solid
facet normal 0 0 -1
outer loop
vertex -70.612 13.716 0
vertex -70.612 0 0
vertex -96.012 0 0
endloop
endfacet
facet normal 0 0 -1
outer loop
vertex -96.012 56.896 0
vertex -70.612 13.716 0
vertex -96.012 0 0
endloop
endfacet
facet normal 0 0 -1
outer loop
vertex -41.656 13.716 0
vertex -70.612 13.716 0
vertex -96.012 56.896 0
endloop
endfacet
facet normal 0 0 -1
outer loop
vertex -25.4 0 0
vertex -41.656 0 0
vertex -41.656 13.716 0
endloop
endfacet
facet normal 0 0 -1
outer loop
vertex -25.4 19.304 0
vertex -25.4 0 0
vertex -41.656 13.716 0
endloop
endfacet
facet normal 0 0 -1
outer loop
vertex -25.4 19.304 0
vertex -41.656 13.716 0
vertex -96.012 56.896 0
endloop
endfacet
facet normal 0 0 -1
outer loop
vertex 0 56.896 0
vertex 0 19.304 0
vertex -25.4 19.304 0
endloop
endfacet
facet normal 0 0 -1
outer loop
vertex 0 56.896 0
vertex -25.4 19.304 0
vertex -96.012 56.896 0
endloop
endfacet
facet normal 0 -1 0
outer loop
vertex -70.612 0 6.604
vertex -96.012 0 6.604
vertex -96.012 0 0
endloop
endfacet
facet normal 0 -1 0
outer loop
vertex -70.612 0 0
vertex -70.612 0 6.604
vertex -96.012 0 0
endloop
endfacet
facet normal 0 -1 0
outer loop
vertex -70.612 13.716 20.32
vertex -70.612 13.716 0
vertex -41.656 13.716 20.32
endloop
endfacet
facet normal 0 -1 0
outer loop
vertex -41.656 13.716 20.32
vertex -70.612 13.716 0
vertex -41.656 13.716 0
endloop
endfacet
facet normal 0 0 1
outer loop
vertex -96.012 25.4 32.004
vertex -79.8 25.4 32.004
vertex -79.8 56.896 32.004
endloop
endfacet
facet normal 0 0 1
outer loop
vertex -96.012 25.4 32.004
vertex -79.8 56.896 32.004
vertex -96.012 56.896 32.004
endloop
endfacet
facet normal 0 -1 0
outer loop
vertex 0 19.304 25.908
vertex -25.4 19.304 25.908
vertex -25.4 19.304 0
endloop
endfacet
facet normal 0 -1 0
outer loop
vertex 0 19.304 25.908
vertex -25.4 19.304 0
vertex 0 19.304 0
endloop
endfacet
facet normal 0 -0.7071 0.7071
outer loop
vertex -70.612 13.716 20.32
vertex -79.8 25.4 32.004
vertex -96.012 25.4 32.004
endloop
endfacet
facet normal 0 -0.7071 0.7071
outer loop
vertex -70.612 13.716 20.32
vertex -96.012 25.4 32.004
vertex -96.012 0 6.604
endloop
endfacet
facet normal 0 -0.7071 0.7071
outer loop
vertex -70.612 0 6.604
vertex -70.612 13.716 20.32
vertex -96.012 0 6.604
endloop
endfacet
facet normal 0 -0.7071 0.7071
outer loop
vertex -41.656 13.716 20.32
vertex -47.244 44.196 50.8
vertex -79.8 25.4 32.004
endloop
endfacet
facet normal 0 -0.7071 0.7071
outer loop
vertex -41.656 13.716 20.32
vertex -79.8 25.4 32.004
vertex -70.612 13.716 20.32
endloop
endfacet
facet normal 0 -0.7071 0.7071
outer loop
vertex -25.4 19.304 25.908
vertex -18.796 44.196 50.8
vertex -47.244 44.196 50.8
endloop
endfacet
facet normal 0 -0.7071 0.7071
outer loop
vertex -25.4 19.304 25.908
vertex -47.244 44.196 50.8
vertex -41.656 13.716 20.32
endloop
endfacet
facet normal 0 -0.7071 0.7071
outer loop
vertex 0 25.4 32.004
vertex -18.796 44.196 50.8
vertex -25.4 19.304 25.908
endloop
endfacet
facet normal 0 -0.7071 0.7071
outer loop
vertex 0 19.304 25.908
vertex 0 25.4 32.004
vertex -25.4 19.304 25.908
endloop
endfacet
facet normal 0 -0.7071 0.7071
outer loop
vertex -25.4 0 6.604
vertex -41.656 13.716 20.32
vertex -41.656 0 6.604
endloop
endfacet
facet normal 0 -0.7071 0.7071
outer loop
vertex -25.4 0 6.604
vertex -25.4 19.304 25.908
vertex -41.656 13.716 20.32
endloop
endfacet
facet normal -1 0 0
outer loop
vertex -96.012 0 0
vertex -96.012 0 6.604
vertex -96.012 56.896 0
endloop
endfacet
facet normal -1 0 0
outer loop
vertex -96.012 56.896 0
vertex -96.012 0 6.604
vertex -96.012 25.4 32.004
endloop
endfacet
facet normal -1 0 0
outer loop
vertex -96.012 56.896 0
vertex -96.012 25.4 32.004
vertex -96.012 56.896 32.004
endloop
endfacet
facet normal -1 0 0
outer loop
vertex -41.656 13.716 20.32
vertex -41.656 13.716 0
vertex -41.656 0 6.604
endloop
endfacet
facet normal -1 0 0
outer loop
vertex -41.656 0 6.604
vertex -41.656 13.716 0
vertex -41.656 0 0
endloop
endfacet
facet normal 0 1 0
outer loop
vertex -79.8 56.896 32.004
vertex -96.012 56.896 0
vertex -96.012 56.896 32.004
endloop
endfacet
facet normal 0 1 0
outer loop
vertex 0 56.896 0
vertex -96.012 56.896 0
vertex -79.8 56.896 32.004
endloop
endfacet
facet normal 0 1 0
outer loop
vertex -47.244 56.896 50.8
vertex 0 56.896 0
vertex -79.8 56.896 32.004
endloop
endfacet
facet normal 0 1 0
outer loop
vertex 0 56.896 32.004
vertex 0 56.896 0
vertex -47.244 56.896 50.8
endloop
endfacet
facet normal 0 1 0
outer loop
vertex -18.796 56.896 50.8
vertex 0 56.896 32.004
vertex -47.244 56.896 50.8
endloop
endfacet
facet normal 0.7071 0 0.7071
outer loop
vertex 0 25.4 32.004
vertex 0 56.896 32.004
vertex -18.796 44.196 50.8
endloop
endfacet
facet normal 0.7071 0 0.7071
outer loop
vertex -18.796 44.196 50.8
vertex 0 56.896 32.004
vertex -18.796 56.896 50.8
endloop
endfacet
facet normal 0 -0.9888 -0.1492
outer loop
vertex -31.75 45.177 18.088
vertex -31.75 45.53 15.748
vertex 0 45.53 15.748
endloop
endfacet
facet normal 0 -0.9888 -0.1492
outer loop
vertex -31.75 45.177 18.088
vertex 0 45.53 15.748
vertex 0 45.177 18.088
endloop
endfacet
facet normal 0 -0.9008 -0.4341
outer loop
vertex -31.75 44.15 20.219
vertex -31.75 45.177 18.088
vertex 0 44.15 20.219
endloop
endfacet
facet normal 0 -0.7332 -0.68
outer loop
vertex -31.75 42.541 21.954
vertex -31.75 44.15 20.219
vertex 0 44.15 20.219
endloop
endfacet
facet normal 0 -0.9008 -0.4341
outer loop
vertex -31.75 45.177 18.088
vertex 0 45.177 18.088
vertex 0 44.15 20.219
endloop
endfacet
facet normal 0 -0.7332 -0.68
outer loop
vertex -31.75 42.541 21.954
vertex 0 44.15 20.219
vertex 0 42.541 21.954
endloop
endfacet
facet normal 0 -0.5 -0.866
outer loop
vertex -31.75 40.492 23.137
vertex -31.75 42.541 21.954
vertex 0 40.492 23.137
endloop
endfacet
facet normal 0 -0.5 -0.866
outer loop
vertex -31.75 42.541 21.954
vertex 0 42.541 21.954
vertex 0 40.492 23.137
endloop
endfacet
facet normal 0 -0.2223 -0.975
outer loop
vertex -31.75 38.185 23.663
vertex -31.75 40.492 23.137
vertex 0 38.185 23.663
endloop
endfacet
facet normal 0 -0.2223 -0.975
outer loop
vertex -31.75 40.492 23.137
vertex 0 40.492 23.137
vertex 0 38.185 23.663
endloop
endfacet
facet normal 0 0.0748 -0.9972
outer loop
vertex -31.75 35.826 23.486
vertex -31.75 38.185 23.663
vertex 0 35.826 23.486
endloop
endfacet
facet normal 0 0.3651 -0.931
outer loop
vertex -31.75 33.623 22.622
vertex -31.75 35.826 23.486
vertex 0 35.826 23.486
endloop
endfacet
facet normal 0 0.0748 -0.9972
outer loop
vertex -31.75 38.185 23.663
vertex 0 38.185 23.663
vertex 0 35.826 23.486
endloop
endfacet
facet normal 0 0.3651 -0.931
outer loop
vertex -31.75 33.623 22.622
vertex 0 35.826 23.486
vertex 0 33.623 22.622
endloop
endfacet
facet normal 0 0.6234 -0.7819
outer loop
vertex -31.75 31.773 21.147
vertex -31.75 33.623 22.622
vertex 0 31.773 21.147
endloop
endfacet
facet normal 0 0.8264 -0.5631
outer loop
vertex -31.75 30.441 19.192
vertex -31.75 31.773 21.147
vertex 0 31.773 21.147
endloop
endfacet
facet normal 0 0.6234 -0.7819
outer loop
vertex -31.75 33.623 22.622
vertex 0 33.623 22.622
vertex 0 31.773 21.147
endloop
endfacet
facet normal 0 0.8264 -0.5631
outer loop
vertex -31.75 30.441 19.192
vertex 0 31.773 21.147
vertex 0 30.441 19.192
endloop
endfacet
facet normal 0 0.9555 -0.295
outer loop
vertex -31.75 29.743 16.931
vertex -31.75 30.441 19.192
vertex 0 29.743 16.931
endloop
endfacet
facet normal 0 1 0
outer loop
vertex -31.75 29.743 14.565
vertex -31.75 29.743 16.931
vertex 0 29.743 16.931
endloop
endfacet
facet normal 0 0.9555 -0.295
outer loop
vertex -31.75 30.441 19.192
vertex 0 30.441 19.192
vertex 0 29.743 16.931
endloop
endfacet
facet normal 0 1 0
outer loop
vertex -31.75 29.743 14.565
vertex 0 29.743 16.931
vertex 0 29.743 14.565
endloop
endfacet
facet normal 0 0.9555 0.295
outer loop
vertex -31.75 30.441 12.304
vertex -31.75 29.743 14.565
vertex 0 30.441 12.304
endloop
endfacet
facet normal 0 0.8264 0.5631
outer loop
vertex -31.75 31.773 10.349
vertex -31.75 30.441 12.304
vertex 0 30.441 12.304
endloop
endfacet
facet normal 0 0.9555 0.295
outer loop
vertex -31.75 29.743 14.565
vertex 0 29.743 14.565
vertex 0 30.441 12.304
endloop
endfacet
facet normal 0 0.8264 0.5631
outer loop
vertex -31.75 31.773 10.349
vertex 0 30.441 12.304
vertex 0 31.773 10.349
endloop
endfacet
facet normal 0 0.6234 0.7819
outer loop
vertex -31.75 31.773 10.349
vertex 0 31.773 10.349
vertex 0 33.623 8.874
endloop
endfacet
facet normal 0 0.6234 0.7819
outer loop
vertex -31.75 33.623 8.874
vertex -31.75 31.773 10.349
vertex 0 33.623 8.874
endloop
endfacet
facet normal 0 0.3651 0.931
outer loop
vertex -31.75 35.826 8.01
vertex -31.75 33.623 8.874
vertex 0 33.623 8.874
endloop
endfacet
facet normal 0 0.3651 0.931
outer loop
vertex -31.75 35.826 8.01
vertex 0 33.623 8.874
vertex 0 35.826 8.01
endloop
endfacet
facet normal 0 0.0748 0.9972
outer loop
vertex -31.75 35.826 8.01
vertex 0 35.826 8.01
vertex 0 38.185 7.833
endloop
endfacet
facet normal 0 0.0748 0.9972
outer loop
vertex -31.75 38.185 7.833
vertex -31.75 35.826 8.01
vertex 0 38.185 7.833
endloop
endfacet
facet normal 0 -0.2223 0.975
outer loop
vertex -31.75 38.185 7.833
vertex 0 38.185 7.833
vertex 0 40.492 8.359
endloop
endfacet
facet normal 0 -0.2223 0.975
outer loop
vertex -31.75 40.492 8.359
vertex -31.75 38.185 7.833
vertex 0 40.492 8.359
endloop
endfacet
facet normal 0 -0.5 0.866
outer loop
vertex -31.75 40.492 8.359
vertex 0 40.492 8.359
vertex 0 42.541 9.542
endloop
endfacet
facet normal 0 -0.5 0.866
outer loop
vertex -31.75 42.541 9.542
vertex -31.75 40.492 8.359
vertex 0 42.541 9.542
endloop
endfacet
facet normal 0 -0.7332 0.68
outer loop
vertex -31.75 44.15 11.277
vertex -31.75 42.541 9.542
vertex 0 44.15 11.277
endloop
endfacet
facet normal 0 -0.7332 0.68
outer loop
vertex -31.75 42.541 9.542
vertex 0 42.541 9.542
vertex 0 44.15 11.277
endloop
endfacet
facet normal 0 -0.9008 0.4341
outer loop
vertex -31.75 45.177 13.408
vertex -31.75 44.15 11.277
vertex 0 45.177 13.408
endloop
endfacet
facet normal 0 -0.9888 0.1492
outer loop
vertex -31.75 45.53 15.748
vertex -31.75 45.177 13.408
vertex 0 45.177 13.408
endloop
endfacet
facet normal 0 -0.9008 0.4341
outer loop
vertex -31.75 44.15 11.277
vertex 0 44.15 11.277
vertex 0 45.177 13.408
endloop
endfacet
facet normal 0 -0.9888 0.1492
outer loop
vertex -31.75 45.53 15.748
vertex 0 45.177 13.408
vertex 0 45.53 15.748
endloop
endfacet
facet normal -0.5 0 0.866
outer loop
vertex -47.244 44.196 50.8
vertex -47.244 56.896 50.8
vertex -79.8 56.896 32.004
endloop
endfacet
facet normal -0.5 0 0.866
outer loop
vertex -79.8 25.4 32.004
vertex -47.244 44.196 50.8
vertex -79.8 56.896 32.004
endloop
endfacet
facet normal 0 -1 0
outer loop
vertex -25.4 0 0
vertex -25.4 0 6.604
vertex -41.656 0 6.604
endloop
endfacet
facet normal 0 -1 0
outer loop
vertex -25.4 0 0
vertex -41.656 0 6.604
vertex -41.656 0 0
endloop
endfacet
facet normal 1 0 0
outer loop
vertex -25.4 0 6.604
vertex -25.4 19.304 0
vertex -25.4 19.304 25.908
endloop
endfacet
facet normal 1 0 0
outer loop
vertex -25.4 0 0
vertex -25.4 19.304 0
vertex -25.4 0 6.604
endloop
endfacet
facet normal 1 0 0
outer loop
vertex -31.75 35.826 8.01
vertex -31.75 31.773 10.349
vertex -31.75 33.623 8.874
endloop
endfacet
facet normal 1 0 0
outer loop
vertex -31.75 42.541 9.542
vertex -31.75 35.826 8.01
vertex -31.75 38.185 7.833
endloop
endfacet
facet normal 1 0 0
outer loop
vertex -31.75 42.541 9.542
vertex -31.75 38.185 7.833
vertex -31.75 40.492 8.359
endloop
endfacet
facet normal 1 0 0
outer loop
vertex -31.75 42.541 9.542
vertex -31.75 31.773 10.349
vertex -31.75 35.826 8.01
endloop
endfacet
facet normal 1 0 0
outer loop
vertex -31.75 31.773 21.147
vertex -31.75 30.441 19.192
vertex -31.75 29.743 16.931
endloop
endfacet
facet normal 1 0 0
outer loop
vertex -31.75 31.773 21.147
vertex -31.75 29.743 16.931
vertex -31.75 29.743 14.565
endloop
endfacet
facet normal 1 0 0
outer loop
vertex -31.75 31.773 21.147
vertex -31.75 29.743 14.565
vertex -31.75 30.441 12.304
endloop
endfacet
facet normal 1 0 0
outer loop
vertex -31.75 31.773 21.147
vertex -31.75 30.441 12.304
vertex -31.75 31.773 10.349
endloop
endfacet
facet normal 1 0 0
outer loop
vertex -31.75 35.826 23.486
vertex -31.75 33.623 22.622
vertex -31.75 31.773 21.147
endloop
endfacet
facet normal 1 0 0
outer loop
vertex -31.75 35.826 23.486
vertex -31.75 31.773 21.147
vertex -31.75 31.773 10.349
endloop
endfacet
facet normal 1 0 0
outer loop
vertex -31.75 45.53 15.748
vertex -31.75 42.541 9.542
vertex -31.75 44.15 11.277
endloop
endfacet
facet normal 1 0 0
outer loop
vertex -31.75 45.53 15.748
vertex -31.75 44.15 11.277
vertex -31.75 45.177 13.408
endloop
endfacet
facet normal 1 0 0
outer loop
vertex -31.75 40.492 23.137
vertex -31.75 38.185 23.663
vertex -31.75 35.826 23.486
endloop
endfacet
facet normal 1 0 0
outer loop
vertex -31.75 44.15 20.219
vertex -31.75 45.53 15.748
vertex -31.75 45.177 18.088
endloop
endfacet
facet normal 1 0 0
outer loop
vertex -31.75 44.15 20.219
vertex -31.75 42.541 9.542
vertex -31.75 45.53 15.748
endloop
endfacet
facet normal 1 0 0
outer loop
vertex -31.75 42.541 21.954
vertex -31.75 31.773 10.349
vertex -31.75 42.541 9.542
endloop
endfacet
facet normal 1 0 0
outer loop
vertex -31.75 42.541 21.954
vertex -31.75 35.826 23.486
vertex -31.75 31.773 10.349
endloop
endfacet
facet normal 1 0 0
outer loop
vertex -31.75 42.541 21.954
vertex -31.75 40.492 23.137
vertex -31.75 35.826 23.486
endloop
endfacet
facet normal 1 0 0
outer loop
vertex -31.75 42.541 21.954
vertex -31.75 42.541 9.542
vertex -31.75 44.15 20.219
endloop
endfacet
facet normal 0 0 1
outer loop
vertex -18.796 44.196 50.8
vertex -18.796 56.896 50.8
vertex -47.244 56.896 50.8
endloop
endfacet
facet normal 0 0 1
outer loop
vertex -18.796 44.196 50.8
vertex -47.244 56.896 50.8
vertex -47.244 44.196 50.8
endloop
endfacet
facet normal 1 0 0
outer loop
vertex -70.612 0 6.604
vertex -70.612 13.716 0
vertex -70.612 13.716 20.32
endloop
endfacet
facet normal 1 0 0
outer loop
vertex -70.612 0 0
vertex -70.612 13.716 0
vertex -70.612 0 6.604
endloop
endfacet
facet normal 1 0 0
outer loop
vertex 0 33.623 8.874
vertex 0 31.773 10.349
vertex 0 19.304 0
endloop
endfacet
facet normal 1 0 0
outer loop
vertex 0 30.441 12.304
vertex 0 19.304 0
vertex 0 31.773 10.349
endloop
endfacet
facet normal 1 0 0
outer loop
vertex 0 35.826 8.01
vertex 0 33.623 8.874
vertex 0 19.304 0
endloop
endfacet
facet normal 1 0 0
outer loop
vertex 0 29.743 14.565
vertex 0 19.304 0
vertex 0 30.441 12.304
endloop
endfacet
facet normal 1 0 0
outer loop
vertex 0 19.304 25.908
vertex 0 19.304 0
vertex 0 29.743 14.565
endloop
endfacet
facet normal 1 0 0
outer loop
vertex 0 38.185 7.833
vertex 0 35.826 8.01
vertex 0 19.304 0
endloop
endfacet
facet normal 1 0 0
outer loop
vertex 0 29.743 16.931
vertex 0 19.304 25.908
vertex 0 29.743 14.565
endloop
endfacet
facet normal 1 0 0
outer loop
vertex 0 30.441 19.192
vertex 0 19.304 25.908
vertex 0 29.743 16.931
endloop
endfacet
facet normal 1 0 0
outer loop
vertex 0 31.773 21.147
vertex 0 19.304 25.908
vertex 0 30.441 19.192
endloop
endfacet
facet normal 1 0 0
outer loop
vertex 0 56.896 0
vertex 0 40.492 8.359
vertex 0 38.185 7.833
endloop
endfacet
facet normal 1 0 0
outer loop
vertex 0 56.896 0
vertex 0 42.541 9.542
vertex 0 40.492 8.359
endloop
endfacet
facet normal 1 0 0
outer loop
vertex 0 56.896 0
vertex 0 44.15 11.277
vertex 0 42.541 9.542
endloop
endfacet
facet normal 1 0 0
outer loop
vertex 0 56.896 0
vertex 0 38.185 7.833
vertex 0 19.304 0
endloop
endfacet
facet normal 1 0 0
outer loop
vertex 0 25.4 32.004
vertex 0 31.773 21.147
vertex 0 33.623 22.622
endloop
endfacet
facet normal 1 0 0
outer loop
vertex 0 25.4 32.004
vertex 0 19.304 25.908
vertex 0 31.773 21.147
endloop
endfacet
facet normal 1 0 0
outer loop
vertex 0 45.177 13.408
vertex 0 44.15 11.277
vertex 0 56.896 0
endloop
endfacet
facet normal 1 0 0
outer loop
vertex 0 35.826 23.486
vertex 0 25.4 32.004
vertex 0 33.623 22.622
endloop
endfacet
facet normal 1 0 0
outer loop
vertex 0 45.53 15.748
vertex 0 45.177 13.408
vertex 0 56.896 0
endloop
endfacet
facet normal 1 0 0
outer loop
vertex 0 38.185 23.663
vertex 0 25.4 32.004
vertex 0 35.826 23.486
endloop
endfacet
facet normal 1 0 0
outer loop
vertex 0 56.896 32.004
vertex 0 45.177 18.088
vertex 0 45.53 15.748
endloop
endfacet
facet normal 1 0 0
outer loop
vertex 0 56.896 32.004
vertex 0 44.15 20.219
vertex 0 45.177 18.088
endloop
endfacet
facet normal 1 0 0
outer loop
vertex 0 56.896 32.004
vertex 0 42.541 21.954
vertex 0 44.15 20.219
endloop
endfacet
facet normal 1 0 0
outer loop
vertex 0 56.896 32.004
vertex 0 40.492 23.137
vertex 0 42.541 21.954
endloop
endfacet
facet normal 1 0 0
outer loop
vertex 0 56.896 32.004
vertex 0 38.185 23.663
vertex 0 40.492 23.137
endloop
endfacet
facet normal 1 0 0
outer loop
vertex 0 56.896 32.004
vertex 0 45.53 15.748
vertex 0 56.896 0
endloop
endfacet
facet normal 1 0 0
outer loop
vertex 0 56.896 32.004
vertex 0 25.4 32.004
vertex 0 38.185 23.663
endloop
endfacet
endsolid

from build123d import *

# Parameters (mm, degrees)
F0_R     = 7.9375
F1_DEPTH = 96.012
F2_DEPTH = 31.75
F3_W     = 25.4
F3_H     = 19.304
F3_W_2   = 28.956
F3_H_2   = 13.716
F4_DEPTH = 51.562
F6_DEPTH = 69.088


with BuildPart() as f1:
    # F0 (on Right) → F1 (new body)
    with BuildSketch(Plane.YZ):
        Polygon((0, 6.604), (0, 0), (56.896, 0), (56.896, 50.8), (44.196, 50.8), align=None)
        with Locations((37.592, 15.748)):
            Circle(F0_R, mode=Mode.SUBTRACT)
        with Locations((37.592, 15.748)):
            Circle(F0_R)
    extrude(amount=-F1_DEPTH)

    # F0 (on Right) → F2 (cut)
    with BuildSketch(Plane.YZ):
        with Locations((37.592, 15.748)):
            Circle(F0_R)
    extrude(amount=-F2_DEPTH, mode=Mode.SUBTRACT)

    # F3 (on face) → F4 (cut)
    with BuildSketch(Plane(origin=(0, 0, 0), x_dir=(1, 0, 0), z_dir=(0, 0, -1))):
        with Locations((-12.7, -9.652)):
            Rectangle(F3_W, F3_H)
        with Locations((-56.134, -6.858)):
            Rectangle(F3_W_2, F3_H_2)
    extrude(amount=-F4_DEPTH, mode=Mode.SUBTRACT)

    # F5 (on face) → F6 (cut)
    with BuildSketch(Plane(origin=(0, 56.896, 0), x_dir=(-1, 0, 0), z_dir=(0, 1, 0))):
        Polygon((18.796, 50.8), (0, 50.8), (0, 32.004), align=None)
        Polygon((96.012, 50.8), (47.244, 50.8), (79.799627, 32.004), (96.012, 32.004), align=None)
    extrude(amount=-F6_DEPTH, mode=Mode.SUBTRACT)


solid = f1.part
